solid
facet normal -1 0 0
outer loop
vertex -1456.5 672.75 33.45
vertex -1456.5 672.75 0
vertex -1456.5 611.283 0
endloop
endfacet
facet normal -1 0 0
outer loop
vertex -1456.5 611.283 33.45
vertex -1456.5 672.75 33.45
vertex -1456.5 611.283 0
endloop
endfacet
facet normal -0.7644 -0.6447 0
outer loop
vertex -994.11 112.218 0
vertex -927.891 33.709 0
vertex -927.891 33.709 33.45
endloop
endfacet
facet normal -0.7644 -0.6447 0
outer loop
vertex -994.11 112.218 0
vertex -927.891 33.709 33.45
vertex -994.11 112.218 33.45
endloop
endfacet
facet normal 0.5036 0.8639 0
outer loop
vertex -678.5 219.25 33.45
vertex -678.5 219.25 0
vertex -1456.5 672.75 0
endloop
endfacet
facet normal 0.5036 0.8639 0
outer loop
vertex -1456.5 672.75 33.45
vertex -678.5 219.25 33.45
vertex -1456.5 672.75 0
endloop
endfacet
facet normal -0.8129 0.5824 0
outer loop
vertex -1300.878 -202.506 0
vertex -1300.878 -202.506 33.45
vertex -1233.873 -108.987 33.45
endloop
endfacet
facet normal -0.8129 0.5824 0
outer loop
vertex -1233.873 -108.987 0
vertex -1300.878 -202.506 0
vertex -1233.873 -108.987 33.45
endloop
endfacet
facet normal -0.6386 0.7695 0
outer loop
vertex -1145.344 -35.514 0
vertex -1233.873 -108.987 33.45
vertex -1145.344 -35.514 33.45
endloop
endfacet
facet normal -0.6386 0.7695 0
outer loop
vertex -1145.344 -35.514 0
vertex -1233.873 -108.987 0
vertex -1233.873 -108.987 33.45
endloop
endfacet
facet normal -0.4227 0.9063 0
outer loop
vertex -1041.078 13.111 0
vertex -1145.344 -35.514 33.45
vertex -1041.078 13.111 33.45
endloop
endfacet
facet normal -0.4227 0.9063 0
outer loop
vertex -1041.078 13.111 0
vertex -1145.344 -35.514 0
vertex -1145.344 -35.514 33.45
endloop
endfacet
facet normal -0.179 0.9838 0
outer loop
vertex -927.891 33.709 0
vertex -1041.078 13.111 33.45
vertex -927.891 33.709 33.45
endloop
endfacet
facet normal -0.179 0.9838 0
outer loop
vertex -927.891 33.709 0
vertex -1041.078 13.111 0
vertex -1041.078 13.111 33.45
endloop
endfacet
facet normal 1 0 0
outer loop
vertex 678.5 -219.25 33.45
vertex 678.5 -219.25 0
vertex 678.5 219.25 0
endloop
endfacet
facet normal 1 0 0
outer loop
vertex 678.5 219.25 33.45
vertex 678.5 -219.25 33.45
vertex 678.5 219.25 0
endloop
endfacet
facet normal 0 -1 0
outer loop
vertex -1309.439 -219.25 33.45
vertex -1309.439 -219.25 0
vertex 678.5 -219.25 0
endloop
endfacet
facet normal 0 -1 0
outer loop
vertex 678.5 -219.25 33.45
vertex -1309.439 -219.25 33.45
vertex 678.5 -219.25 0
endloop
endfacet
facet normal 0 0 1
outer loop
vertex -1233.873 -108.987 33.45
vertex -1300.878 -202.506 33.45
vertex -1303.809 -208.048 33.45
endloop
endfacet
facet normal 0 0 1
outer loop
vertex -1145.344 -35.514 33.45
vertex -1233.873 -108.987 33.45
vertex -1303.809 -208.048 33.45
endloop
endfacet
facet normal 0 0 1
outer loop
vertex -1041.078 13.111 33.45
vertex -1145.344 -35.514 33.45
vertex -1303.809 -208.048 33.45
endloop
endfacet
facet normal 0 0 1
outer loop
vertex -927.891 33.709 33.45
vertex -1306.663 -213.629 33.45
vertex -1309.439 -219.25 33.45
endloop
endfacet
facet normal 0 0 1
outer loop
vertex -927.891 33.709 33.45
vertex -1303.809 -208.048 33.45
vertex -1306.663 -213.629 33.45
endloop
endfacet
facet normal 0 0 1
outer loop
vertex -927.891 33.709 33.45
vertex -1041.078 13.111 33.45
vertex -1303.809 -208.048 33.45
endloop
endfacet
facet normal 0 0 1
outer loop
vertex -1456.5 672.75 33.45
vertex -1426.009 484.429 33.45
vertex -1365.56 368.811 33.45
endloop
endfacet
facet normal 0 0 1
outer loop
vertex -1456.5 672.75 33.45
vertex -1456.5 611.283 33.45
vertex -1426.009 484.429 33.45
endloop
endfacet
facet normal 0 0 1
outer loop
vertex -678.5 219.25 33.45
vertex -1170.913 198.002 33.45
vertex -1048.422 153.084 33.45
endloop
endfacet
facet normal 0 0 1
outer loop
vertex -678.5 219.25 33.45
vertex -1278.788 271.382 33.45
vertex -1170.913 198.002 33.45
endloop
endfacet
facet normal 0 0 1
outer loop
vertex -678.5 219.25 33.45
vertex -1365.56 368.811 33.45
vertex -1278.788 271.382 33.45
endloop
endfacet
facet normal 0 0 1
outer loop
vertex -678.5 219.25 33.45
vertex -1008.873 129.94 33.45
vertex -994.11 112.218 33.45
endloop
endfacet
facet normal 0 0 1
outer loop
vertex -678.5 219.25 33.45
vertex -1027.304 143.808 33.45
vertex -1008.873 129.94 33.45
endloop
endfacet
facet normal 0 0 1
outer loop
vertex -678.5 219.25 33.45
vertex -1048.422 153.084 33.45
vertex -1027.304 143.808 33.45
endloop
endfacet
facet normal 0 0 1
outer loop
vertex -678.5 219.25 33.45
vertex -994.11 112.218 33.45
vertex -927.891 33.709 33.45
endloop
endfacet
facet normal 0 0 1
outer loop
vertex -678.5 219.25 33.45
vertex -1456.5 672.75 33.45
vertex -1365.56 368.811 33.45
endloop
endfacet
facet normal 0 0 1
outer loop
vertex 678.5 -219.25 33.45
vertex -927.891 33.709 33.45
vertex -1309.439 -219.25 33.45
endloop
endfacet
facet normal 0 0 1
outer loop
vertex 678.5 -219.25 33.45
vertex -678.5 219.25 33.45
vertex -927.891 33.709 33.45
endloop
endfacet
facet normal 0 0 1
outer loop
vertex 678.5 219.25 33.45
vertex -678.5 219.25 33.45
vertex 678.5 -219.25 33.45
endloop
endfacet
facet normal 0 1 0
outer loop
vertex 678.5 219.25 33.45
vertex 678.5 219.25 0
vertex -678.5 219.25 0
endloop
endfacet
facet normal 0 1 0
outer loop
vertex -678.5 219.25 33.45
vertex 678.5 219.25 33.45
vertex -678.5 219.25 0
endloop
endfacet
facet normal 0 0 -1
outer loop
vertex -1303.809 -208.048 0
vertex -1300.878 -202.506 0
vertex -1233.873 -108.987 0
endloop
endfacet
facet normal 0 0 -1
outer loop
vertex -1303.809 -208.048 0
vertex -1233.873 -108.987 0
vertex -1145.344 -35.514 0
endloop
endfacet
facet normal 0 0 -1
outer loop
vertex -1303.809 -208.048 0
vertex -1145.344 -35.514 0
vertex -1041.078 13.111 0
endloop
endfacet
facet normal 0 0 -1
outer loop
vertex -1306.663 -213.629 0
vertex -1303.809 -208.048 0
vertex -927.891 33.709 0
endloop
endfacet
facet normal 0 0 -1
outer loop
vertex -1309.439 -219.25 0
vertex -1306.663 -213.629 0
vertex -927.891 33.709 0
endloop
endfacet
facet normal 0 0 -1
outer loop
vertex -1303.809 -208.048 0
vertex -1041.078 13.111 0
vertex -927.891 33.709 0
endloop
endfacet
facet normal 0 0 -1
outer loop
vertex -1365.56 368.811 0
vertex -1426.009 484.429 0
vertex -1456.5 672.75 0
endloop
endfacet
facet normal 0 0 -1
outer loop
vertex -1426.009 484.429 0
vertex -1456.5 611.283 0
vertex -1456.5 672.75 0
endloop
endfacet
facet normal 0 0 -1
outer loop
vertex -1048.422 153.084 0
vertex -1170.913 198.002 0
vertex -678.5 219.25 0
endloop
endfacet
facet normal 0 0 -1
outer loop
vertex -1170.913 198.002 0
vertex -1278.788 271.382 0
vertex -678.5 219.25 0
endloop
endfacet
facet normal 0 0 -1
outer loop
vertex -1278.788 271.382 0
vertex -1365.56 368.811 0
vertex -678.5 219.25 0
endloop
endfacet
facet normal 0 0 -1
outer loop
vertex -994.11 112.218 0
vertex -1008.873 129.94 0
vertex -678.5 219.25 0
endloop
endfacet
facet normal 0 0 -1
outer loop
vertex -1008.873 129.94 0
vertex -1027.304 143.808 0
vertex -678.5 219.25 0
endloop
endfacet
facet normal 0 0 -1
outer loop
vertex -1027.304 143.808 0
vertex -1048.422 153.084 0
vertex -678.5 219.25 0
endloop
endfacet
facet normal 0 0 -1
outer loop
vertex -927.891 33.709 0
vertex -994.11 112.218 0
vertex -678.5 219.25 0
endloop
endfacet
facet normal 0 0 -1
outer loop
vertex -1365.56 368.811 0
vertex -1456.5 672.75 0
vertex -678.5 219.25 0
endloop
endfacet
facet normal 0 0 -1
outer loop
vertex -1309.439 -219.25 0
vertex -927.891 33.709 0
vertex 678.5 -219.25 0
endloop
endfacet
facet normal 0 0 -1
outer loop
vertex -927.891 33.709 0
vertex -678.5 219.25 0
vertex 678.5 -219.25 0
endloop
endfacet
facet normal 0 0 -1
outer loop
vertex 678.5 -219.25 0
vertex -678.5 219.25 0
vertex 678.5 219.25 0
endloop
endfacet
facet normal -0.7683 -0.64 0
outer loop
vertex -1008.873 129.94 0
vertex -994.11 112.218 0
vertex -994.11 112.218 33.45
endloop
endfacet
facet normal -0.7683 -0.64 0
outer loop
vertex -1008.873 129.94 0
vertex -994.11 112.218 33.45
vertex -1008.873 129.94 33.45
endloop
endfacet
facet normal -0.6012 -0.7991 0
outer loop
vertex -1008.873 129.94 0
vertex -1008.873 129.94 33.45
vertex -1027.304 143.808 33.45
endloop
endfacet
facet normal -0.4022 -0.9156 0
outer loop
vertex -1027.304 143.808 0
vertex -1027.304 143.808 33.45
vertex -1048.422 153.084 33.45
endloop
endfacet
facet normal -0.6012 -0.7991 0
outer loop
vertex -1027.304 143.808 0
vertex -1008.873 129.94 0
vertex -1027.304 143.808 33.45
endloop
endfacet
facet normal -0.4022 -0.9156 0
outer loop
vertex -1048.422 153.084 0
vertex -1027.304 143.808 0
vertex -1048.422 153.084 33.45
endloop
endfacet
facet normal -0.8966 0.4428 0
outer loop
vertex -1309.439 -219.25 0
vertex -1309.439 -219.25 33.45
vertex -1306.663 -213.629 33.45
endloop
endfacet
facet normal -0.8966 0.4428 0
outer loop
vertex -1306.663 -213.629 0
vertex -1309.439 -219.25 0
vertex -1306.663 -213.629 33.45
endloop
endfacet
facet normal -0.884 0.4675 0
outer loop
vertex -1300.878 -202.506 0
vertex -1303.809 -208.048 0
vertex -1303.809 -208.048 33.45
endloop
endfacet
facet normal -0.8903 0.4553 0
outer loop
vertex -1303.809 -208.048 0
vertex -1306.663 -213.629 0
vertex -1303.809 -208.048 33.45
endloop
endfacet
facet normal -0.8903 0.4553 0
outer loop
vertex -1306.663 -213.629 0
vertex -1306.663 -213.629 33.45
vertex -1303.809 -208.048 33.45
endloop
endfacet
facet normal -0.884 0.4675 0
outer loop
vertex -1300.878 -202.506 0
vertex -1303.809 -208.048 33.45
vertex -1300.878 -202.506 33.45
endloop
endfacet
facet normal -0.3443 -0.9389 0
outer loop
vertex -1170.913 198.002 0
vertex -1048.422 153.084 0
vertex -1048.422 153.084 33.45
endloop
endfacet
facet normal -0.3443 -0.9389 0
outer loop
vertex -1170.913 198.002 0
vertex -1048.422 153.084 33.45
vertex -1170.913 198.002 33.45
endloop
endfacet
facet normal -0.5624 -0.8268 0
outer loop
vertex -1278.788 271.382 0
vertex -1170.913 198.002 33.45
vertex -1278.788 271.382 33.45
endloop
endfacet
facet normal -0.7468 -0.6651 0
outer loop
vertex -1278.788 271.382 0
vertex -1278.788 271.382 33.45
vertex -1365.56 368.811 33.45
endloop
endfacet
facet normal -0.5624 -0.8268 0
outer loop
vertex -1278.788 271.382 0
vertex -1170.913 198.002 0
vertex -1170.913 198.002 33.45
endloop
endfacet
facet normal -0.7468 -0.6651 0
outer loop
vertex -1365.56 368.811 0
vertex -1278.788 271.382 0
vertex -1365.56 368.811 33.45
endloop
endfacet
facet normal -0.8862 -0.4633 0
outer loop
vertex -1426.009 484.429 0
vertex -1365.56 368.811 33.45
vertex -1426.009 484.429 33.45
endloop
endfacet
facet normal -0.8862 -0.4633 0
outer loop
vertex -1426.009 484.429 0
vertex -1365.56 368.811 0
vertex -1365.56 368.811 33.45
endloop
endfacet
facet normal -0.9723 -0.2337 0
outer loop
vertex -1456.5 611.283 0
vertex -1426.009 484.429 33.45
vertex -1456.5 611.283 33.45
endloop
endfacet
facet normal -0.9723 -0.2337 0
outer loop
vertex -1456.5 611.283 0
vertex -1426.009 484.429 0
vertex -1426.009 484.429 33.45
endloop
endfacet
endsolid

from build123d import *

# Parameters (mm, degrees)
BOSS_EXTRUDE1_DEPTH = 33.45
CAVITY3_DEPTH       = 33.45
CUT_EXTRUDE2_REACH  = 1606.713


# Read off the part's stored shape, not the designer's step: Cavity3
with BuildPart() as part:
    # Sketch1 → Boss-Extrude1 (new body)
    with BuildSketch(Plane.XY):
        Polygon((-678.5, 219.25), (-1456.5, 672.75), (-1456.5, -219.25), (-678.5, -219.25), (678.5, -219.25), (678.5, 219.25), align=None)
    extrude(amount=BOSS_EXTRUDE1_DEPTH)

    # Cavity3 outline → Cavity3 (cut)
    with BuildSketch(Plane.XY):
        with BuildLine():
            Line((-1456.5, -202.506493086), (-1300.878272365, -202.506493086))
            ThreePointArc((-1300.878272365, -202.506493086), (-1145.343683701, -35.513747144), (-927.890567992, 33.708560944))
            Line((-927.890567992, 33.708560944), (-994.109648548, 112.218170508))
            ThreePointArc((-994.109648548, 112.218170508), (-1017.687293376, 137.407064936), (-1048.421985466, 153.083940911))
            ThreePointArc((-1048.421985466, 153.083940911), (-1325.171989397, 317.426039094), (-1456.5, 611.282881012))
            Line((-1456.5, 611.282881012), (-1456.5, -202.506493086))
        make_face()
    extrude(amount=CAVITY3_DEPTH, mode=Mode.SUBTRACT)

    # Sketch6 → Cut-Extrude2 (cut, up to next)
    with BuildSketch(Plane.XY.offset(33.45), mode=Mode.PRIVATE) as cut_extrude2_sk1:
        with BuildLine():
            Line((-1300.878272365, -202.506493086), (-1456.5, -202.506493086))
            Line((-1456.5, -202.506493086), (-1456.5, -219.25))
            Line((-1456.5, -219.25), (-1309.43889328, -219.25))
            ThreePointArc((-1309.43889328, -219.25), (-1305.246054091, -210.833524229), (-1300.878272365, -202.506493086))
        make_face()
    cut_extrude2_tool1 = extrude(cut_extrude2_sk1.sketch, amount=-CUT_EXTRUDE2_REACH, mode=Mode.PRIVATE) & part.part
    add(cut_extrude2_tool1.solids().sort_by_distance((-1380.845886, -210.799292, 33.45))[0], mode=Mode.SUBTRACT)


solid = part.part
